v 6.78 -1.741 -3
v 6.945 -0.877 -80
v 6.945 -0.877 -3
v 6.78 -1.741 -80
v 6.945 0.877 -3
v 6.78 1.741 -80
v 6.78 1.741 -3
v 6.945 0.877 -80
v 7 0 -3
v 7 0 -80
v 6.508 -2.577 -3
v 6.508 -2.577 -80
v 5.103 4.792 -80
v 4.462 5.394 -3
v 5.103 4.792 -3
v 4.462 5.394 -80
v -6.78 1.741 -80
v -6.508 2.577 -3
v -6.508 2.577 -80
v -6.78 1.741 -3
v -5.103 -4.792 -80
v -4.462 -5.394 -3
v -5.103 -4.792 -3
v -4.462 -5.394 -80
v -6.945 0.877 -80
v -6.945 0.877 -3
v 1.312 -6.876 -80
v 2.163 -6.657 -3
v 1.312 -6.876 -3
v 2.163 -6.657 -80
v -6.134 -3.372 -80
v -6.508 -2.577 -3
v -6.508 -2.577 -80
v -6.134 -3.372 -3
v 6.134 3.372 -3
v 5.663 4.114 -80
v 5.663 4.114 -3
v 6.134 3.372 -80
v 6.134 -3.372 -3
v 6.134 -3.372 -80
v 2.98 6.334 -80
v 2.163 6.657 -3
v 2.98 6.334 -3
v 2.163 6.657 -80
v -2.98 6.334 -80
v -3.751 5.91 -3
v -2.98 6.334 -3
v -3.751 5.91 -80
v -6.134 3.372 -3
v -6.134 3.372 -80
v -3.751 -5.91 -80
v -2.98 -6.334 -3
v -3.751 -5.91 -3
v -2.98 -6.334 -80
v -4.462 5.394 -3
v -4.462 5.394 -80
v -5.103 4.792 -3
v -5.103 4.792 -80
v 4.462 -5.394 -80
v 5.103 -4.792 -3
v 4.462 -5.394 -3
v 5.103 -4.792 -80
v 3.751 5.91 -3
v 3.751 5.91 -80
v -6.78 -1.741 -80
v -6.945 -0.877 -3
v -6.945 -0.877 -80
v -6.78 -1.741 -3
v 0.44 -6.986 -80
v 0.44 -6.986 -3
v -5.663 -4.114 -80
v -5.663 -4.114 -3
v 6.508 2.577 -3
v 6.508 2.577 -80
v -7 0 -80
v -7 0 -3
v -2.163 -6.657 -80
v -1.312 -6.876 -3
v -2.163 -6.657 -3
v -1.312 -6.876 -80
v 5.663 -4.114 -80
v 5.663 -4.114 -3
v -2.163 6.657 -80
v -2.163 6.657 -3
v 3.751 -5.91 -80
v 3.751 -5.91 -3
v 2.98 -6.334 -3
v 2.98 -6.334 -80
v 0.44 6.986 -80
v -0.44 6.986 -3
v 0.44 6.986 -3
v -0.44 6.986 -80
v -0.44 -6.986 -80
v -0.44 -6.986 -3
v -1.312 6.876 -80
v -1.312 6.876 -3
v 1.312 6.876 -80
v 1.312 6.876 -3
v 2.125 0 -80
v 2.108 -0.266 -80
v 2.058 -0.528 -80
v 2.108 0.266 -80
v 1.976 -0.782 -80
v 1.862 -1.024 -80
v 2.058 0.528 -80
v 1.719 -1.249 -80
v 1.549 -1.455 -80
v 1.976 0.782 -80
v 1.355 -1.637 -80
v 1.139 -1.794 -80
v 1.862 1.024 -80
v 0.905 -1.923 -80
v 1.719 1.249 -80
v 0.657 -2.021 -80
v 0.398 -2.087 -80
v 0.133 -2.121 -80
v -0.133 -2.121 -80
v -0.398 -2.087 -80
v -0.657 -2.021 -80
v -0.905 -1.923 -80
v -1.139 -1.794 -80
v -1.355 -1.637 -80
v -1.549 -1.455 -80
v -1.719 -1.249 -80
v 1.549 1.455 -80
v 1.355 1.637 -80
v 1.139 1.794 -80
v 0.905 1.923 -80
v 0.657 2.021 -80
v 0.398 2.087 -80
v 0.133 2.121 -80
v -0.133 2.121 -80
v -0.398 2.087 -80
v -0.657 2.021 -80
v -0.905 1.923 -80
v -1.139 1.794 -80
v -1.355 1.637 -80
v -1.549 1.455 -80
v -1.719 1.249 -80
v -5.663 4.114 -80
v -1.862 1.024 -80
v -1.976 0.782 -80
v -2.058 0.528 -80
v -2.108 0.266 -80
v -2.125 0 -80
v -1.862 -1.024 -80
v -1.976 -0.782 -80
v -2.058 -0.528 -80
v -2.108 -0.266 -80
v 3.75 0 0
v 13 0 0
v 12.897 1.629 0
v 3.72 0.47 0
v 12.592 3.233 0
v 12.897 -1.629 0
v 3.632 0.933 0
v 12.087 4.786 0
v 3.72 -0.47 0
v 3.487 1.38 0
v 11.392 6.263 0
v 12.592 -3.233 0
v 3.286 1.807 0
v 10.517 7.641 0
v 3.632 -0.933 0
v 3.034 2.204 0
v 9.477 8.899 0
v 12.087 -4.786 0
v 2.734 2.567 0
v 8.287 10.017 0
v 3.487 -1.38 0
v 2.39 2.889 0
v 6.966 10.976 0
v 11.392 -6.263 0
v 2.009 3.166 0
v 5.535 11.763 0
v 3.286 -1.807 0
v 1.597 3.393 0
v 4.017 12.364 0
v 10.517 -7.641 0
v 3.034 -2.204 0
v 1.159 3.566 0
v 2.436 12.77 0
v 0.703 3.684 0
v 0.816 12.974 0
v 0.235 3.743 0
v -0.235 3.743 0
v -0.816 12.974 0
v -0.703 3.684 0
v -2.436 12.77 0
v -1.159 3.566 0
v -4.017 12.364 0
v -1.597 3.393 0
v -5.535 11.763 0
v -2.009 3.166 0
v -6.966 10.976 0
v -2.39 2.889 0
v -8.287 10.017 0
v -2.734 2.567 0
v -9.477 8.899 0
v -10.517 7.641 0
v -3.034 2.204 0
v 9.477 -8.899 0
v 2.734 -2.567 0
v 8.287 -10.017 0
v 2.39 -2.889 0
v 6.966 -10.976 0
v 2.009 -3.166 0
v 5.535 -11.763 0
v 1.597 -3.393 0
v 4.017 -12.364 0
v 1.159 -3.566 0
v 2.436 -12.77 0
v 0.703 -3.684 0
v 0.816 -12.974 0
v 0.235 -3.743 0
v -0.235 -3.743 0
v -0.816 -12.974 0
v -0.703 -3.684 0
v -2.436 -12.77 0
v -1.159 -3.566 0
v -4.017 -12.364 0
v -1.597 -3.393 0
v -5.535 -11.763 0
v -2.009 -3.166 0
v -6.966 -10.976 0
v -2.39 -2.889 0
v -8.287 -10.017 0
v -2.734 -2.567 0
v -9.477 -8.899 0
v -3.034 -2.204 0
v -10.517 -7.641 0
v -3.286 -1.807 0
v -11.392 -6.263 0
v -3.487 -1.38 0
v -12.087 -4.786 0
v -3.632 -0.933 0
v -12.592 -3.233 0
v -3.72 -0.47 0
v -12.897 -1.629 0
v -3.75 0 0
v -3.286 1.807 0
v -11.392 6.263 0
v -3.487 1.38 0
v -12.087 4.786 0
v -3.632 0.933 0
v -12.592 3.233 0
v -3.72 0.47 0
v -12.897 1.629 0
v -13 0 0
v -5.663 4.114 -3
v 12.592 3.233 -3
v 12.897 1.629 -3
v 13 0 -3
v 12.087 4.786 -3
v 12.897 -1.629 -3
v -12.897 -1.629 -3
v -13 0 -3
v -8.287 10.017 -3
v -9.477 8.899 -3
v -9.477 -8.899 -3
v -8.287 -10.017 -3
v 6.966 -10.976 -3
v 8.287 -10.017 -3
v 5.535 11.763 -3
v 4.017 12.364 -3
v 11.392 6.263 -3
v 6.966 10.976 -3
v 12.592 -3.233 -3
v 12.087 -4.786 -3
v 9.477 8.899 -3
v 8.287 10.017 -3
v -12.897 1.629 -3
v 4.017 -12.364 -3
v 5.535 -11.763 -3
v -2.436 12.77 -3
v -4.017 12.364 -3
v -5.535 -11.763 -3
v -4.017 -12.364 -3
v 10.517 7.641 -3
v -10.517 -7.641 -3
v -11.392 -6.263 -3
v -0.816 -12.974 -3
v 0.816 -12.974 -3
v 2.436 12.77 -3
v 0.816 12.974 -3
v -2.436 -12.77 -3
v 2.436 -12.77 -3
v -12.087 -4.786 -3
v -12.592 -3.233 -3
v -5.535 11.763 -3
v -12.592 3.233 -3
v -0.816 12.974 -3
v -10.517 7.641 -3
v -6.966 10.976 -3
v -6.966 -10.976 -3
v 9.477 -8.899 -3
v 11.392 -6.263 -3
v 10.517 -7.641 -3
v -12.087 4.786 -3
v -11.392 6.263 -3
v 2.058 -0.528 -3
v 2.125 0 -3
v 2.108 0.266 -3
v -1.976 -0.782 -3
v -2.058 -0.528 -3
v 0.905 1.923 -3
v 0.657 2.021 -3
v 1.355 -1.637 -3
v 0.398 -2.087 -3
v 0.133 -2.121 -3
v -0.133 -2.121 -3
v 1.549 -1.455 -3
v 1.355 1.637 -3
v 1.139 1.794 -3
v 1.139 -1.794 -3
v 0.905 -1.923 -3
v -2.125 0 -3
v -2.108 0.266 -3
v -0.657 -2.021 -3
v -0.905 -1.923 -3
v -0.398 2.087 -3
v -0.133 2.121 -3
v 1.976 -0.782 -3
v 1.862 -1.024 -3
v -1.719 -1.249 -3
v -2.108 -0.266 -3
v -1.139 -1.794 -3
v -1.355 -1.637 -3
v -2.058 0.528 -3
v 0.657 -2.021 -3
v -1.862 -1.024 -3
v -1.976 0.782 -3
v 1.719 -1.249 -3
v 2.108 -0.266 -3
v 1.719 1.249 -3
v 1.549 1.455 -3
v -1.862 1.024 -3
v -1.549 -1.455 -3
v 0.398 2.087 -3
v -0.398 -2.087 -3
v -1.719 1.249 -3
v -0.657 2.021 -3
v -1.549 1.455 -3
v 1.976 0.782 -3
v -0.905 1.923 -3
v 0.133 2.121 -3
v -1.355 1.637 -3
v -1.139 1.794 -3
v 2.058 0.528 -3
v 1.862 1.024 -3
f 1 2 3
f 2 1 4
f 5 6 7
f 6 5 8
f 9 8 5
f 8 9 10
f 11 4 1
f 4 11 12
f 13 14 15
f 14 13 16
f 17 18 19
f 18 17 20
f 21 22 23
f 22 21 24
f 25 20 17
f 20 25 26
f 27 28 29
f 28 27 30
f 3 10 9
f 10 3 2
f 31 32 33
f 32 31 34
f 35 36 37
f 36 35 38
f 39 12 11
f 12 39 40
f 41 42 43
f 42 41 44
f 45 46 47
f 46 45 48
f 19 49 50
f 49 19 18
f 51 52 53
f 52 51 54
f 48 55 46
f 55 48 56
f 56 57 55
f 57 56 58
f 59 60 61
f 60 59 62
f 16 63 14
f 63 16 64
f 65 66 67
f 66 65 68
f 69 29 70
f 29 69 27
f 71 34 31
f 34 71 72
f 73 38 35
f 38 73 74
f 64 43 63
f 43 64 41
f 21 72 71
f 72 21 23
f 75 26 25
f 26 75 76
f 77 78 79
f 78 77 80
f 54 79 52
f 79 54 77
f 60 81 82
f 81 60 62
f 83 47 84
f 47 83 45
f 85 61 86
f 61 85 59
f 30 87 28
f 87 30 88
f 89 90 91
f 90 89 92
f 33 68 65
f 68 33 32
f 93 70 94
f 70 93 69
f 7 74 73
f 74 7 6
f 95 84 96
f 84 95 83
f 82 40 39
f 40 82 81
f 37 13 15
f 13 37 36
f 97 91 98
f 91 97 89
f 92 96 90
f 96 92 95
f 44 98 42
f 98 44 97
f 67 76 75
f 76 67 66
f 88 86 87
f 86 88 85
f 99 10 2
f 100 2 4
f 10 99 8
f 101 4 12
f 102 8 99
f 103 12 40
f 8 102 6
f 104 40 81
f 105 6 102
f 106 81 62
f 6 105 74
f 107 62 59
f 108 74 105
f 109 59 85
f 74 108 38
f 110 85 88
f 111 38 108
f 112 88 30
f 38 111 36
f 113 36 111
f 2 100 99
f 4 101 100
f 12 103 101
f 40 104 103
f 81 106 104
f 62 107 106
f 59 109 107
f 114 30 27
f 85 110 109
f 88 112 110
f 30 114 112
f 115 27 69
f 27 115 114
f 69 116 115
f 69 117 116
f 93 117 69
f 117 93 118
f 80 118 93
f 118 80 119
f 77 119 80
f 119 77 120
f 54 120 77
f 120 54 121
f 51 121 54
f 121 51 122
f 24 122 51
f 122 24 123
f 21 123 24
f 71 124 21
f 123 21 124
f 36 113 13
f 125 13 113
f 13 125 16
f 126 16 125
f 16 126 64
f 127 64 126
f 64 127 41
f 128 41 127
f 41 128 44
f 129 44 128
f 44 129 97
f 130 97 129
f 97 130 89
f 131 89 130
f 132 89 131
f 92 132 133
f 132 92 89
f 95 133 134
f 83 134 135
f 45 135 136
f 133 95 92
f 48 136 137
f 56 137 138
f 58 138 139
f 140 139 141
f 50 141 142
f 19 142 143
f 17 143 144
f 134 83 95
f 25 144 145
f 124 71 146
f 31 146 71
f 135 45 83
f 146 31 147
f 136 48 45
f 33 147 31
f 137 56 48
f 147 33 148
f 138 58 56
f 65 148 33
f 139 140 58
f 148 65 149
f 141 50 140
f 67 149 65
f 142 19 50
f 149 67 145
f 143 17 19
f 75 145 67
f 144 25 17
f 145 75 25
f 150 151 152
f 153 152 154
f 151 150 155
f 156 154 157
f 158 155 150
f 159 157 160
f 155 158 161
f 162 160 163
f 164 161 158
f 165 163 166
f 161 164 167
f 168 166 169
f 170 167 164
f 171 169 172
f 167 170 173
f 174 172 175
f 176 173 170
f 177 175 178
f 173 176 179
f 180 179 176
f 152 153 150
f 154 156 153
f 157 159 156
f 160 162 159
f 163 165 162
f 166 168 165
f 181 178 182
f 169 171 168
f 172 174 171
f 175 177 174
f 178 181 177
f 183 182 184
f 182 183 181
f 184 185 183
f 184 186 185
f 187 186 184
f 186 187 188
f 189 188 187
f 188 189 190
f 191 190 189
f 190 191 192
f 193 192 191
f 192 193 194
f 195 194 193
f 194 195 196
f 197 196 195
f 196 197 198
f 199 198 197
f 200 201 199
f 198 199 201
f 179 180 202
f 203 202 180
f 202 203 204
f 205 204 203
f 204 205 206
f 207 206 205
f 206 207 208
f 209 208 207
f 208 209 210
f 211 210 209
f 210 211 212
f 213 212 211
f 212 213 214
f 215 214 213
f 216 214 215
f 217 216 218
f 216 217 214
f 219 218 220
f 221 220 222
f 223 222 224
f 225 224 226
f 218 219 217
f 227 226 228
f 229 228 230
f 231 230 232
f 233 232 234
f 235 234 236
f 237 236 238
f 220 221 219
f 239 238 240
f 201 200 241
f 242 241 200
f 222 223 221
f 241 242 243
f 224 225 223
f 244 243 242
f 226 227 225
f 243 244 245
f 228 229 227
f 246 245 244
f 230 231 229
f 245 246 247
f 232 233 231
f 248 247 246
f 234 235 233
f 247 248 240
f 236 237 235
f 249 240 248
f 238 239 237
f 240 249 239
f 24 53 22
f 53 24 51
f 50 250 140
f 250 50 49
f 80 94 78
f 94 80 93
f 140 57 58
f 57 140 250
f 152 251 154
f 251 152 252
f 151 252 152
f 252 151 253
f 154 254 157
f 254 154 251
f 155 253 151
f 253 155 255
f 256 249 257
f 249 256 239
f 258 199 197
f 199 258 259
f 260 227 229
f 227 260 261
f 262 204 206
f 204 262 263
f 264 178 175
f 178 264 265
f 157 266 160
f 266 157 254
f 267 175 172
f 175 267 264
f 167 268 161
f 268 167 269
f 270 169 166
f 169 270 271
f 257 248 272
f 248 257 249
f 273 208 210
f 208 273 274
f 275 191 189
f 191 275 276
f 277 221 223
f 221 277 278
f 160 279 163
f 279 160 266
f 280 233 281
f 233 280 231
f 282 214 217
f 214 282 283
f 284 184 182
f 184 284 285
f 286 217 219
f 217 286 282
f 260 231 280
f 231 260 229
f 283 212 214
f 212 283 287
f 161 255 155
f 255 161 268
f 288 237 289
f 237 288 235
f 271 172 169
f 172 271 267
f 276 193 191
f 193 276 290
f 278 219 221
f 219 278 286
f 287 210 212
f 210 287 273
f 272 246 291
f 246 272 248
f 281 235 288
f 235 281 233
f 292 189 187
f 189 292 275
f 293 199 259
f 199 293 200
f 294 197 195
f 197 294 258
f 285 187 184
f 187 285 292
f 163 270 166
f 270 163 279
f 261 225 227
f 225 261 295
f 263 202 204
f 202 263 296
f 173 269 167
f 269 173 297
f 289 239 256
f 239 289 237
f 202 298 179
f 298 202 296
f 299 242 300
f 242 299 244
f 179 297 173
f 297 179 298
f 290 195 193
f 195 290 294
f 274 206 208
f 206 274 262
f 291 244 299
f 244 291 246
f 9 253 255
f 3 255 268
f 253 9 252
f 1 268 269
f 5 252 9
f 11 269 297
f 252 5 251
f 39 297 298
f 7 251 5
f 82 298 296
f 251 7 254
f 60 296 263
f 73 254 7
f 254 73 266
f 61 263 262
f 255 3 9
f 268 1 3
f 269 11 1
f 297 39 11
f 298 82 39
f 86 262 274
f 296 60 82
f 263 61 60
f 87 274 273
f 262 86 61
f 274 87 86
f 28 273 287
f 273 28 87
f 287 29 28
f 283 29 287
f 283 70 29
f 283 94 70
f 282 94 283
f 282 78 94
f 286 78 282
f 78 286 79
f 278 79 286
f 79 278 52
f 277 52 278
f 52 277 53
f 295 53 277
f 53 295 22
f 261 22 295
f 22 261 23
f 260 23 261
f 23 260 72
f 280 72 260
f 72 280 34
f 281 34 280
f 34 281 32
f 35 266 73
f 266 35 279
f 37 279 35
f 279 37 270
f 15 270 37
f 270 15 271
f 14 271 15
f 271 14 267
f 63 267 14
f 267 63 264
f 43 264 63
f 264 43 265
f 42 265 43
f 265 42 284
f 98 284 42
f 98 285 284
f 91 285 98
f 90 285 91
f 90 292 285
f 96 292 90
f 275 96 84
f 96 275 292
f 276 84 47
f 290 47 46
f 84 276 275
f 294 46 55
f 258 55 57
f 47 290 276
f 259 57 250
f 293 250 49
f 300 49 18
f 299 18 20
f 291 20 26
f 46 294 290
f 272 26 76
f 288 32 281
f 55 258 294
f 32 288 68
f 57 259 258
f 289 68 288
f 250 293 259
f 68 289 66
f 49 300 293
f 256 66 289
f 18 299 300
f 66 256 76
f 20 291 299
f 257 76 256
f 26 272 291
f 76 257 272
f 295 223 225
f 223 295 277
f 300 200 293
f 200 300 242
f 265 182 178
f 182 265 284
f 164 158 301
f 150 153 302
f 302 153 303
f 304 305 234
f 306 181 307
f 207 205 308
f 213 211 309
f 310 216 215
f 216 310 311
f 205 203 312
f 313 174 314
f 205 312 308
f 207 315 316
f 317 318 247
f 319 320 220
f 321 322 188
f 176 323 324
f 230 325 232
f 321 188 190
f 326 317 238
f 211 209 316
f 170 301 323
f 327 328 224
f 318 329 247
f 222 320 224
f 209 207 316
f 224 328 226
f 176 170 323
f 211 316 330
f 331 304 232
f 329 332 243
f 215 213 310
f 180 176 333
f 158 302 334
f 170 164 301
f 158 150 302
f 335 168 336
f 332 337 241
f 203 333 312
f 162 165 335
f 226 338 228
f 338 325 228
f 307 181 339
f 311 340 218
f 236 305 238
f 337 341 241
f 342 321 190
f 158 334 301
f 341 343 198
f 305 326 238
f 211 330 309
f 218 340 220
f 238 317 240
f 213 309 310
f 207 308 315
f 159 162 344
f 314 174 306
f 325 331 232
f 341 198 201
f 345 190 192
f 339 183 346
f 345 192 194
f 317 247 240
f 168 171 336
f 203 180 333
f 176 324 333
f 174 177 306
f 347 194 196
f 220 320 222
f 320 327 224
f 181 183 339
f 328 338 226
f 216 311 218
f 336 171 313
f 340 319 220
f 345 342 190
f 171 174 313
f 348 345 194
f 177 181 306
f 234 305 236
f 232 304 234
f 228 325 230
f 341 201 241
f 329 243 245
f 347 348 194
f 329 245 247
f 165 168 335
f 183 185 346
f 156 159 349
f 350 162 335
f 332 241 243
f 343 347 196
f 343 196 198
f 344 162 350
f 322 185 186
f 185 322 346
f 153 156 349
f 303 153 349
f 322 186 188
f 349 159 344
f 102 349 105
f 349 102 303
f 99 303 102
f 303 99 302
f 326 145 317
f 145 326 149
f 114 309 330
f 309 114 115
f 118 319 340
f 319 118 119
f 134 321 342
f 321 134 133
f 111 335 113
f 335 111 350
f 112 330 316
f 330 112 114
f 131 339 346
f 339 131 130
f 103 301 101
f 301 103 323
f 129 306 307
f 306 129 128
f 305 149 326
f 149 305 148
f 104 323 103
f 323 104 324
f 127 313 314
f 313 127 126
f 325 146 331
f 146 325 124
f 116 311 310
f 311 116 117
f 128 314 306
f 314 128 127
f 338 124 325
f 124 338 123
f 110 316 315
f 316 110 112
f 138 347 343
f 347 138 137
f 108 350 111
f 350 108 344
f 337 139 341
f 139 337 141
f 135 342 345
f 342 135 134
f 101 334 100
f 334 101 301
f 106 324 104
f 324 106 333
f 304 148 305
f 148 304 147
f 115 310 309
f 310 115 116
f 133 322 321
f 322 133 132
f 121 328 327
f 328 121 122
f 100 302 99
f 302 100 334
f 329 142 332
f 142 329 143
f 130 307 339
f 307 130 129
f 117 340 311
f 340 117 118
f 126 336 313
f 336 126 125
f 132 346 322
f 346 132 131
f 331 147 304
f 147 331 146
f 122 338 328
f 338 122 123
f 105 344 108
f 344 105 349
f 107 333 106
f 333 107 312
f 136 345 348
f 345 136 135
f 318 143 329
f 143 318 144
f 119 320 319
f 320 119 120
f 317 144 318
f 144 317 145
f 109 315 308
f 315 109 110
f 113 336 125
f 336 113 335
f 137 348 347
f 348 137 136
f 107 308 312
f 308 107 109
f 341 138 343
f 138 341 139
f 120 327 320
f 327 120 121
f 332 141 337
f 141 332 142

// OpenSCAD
$fn = 50;


difference() {
	union() {
		translate(v = [0, 0, -80.0000000000]) {
			cylinder(h = 80, r = 7.0000000000);
		}
		translate(v = [0, 0, -3.0000000000]) {
			cylinder(h = 3, r = 13.0000000000);
		}
	}
	union() {
		translate(v = [0, 0, 0]) {
			rotate(a = [0, 0, 0]) {
				difference() {
					union() {
						#translate(v = [0, 0, -80.0000000000]) {
							cylinder(h = 80, r = 2.0000000000);
						}
						#translate(v = [0, 0, -3]) {
							cylinder(h = 3, r = 7.0000000000, r1 = 2.1250000000, r2 = 3.7500000000);
						}
						#translate(v = [0, 0, -80.0000000000]) {
							cylinder(h = 80, r = 2.1250000000);
						}
						#translate(v = [0, 0, -80.0000000000]) {
							cylinder(h = 80, r = 2.0000000000);
						}
					}
					union();
				}
			}
		}
	}
}
